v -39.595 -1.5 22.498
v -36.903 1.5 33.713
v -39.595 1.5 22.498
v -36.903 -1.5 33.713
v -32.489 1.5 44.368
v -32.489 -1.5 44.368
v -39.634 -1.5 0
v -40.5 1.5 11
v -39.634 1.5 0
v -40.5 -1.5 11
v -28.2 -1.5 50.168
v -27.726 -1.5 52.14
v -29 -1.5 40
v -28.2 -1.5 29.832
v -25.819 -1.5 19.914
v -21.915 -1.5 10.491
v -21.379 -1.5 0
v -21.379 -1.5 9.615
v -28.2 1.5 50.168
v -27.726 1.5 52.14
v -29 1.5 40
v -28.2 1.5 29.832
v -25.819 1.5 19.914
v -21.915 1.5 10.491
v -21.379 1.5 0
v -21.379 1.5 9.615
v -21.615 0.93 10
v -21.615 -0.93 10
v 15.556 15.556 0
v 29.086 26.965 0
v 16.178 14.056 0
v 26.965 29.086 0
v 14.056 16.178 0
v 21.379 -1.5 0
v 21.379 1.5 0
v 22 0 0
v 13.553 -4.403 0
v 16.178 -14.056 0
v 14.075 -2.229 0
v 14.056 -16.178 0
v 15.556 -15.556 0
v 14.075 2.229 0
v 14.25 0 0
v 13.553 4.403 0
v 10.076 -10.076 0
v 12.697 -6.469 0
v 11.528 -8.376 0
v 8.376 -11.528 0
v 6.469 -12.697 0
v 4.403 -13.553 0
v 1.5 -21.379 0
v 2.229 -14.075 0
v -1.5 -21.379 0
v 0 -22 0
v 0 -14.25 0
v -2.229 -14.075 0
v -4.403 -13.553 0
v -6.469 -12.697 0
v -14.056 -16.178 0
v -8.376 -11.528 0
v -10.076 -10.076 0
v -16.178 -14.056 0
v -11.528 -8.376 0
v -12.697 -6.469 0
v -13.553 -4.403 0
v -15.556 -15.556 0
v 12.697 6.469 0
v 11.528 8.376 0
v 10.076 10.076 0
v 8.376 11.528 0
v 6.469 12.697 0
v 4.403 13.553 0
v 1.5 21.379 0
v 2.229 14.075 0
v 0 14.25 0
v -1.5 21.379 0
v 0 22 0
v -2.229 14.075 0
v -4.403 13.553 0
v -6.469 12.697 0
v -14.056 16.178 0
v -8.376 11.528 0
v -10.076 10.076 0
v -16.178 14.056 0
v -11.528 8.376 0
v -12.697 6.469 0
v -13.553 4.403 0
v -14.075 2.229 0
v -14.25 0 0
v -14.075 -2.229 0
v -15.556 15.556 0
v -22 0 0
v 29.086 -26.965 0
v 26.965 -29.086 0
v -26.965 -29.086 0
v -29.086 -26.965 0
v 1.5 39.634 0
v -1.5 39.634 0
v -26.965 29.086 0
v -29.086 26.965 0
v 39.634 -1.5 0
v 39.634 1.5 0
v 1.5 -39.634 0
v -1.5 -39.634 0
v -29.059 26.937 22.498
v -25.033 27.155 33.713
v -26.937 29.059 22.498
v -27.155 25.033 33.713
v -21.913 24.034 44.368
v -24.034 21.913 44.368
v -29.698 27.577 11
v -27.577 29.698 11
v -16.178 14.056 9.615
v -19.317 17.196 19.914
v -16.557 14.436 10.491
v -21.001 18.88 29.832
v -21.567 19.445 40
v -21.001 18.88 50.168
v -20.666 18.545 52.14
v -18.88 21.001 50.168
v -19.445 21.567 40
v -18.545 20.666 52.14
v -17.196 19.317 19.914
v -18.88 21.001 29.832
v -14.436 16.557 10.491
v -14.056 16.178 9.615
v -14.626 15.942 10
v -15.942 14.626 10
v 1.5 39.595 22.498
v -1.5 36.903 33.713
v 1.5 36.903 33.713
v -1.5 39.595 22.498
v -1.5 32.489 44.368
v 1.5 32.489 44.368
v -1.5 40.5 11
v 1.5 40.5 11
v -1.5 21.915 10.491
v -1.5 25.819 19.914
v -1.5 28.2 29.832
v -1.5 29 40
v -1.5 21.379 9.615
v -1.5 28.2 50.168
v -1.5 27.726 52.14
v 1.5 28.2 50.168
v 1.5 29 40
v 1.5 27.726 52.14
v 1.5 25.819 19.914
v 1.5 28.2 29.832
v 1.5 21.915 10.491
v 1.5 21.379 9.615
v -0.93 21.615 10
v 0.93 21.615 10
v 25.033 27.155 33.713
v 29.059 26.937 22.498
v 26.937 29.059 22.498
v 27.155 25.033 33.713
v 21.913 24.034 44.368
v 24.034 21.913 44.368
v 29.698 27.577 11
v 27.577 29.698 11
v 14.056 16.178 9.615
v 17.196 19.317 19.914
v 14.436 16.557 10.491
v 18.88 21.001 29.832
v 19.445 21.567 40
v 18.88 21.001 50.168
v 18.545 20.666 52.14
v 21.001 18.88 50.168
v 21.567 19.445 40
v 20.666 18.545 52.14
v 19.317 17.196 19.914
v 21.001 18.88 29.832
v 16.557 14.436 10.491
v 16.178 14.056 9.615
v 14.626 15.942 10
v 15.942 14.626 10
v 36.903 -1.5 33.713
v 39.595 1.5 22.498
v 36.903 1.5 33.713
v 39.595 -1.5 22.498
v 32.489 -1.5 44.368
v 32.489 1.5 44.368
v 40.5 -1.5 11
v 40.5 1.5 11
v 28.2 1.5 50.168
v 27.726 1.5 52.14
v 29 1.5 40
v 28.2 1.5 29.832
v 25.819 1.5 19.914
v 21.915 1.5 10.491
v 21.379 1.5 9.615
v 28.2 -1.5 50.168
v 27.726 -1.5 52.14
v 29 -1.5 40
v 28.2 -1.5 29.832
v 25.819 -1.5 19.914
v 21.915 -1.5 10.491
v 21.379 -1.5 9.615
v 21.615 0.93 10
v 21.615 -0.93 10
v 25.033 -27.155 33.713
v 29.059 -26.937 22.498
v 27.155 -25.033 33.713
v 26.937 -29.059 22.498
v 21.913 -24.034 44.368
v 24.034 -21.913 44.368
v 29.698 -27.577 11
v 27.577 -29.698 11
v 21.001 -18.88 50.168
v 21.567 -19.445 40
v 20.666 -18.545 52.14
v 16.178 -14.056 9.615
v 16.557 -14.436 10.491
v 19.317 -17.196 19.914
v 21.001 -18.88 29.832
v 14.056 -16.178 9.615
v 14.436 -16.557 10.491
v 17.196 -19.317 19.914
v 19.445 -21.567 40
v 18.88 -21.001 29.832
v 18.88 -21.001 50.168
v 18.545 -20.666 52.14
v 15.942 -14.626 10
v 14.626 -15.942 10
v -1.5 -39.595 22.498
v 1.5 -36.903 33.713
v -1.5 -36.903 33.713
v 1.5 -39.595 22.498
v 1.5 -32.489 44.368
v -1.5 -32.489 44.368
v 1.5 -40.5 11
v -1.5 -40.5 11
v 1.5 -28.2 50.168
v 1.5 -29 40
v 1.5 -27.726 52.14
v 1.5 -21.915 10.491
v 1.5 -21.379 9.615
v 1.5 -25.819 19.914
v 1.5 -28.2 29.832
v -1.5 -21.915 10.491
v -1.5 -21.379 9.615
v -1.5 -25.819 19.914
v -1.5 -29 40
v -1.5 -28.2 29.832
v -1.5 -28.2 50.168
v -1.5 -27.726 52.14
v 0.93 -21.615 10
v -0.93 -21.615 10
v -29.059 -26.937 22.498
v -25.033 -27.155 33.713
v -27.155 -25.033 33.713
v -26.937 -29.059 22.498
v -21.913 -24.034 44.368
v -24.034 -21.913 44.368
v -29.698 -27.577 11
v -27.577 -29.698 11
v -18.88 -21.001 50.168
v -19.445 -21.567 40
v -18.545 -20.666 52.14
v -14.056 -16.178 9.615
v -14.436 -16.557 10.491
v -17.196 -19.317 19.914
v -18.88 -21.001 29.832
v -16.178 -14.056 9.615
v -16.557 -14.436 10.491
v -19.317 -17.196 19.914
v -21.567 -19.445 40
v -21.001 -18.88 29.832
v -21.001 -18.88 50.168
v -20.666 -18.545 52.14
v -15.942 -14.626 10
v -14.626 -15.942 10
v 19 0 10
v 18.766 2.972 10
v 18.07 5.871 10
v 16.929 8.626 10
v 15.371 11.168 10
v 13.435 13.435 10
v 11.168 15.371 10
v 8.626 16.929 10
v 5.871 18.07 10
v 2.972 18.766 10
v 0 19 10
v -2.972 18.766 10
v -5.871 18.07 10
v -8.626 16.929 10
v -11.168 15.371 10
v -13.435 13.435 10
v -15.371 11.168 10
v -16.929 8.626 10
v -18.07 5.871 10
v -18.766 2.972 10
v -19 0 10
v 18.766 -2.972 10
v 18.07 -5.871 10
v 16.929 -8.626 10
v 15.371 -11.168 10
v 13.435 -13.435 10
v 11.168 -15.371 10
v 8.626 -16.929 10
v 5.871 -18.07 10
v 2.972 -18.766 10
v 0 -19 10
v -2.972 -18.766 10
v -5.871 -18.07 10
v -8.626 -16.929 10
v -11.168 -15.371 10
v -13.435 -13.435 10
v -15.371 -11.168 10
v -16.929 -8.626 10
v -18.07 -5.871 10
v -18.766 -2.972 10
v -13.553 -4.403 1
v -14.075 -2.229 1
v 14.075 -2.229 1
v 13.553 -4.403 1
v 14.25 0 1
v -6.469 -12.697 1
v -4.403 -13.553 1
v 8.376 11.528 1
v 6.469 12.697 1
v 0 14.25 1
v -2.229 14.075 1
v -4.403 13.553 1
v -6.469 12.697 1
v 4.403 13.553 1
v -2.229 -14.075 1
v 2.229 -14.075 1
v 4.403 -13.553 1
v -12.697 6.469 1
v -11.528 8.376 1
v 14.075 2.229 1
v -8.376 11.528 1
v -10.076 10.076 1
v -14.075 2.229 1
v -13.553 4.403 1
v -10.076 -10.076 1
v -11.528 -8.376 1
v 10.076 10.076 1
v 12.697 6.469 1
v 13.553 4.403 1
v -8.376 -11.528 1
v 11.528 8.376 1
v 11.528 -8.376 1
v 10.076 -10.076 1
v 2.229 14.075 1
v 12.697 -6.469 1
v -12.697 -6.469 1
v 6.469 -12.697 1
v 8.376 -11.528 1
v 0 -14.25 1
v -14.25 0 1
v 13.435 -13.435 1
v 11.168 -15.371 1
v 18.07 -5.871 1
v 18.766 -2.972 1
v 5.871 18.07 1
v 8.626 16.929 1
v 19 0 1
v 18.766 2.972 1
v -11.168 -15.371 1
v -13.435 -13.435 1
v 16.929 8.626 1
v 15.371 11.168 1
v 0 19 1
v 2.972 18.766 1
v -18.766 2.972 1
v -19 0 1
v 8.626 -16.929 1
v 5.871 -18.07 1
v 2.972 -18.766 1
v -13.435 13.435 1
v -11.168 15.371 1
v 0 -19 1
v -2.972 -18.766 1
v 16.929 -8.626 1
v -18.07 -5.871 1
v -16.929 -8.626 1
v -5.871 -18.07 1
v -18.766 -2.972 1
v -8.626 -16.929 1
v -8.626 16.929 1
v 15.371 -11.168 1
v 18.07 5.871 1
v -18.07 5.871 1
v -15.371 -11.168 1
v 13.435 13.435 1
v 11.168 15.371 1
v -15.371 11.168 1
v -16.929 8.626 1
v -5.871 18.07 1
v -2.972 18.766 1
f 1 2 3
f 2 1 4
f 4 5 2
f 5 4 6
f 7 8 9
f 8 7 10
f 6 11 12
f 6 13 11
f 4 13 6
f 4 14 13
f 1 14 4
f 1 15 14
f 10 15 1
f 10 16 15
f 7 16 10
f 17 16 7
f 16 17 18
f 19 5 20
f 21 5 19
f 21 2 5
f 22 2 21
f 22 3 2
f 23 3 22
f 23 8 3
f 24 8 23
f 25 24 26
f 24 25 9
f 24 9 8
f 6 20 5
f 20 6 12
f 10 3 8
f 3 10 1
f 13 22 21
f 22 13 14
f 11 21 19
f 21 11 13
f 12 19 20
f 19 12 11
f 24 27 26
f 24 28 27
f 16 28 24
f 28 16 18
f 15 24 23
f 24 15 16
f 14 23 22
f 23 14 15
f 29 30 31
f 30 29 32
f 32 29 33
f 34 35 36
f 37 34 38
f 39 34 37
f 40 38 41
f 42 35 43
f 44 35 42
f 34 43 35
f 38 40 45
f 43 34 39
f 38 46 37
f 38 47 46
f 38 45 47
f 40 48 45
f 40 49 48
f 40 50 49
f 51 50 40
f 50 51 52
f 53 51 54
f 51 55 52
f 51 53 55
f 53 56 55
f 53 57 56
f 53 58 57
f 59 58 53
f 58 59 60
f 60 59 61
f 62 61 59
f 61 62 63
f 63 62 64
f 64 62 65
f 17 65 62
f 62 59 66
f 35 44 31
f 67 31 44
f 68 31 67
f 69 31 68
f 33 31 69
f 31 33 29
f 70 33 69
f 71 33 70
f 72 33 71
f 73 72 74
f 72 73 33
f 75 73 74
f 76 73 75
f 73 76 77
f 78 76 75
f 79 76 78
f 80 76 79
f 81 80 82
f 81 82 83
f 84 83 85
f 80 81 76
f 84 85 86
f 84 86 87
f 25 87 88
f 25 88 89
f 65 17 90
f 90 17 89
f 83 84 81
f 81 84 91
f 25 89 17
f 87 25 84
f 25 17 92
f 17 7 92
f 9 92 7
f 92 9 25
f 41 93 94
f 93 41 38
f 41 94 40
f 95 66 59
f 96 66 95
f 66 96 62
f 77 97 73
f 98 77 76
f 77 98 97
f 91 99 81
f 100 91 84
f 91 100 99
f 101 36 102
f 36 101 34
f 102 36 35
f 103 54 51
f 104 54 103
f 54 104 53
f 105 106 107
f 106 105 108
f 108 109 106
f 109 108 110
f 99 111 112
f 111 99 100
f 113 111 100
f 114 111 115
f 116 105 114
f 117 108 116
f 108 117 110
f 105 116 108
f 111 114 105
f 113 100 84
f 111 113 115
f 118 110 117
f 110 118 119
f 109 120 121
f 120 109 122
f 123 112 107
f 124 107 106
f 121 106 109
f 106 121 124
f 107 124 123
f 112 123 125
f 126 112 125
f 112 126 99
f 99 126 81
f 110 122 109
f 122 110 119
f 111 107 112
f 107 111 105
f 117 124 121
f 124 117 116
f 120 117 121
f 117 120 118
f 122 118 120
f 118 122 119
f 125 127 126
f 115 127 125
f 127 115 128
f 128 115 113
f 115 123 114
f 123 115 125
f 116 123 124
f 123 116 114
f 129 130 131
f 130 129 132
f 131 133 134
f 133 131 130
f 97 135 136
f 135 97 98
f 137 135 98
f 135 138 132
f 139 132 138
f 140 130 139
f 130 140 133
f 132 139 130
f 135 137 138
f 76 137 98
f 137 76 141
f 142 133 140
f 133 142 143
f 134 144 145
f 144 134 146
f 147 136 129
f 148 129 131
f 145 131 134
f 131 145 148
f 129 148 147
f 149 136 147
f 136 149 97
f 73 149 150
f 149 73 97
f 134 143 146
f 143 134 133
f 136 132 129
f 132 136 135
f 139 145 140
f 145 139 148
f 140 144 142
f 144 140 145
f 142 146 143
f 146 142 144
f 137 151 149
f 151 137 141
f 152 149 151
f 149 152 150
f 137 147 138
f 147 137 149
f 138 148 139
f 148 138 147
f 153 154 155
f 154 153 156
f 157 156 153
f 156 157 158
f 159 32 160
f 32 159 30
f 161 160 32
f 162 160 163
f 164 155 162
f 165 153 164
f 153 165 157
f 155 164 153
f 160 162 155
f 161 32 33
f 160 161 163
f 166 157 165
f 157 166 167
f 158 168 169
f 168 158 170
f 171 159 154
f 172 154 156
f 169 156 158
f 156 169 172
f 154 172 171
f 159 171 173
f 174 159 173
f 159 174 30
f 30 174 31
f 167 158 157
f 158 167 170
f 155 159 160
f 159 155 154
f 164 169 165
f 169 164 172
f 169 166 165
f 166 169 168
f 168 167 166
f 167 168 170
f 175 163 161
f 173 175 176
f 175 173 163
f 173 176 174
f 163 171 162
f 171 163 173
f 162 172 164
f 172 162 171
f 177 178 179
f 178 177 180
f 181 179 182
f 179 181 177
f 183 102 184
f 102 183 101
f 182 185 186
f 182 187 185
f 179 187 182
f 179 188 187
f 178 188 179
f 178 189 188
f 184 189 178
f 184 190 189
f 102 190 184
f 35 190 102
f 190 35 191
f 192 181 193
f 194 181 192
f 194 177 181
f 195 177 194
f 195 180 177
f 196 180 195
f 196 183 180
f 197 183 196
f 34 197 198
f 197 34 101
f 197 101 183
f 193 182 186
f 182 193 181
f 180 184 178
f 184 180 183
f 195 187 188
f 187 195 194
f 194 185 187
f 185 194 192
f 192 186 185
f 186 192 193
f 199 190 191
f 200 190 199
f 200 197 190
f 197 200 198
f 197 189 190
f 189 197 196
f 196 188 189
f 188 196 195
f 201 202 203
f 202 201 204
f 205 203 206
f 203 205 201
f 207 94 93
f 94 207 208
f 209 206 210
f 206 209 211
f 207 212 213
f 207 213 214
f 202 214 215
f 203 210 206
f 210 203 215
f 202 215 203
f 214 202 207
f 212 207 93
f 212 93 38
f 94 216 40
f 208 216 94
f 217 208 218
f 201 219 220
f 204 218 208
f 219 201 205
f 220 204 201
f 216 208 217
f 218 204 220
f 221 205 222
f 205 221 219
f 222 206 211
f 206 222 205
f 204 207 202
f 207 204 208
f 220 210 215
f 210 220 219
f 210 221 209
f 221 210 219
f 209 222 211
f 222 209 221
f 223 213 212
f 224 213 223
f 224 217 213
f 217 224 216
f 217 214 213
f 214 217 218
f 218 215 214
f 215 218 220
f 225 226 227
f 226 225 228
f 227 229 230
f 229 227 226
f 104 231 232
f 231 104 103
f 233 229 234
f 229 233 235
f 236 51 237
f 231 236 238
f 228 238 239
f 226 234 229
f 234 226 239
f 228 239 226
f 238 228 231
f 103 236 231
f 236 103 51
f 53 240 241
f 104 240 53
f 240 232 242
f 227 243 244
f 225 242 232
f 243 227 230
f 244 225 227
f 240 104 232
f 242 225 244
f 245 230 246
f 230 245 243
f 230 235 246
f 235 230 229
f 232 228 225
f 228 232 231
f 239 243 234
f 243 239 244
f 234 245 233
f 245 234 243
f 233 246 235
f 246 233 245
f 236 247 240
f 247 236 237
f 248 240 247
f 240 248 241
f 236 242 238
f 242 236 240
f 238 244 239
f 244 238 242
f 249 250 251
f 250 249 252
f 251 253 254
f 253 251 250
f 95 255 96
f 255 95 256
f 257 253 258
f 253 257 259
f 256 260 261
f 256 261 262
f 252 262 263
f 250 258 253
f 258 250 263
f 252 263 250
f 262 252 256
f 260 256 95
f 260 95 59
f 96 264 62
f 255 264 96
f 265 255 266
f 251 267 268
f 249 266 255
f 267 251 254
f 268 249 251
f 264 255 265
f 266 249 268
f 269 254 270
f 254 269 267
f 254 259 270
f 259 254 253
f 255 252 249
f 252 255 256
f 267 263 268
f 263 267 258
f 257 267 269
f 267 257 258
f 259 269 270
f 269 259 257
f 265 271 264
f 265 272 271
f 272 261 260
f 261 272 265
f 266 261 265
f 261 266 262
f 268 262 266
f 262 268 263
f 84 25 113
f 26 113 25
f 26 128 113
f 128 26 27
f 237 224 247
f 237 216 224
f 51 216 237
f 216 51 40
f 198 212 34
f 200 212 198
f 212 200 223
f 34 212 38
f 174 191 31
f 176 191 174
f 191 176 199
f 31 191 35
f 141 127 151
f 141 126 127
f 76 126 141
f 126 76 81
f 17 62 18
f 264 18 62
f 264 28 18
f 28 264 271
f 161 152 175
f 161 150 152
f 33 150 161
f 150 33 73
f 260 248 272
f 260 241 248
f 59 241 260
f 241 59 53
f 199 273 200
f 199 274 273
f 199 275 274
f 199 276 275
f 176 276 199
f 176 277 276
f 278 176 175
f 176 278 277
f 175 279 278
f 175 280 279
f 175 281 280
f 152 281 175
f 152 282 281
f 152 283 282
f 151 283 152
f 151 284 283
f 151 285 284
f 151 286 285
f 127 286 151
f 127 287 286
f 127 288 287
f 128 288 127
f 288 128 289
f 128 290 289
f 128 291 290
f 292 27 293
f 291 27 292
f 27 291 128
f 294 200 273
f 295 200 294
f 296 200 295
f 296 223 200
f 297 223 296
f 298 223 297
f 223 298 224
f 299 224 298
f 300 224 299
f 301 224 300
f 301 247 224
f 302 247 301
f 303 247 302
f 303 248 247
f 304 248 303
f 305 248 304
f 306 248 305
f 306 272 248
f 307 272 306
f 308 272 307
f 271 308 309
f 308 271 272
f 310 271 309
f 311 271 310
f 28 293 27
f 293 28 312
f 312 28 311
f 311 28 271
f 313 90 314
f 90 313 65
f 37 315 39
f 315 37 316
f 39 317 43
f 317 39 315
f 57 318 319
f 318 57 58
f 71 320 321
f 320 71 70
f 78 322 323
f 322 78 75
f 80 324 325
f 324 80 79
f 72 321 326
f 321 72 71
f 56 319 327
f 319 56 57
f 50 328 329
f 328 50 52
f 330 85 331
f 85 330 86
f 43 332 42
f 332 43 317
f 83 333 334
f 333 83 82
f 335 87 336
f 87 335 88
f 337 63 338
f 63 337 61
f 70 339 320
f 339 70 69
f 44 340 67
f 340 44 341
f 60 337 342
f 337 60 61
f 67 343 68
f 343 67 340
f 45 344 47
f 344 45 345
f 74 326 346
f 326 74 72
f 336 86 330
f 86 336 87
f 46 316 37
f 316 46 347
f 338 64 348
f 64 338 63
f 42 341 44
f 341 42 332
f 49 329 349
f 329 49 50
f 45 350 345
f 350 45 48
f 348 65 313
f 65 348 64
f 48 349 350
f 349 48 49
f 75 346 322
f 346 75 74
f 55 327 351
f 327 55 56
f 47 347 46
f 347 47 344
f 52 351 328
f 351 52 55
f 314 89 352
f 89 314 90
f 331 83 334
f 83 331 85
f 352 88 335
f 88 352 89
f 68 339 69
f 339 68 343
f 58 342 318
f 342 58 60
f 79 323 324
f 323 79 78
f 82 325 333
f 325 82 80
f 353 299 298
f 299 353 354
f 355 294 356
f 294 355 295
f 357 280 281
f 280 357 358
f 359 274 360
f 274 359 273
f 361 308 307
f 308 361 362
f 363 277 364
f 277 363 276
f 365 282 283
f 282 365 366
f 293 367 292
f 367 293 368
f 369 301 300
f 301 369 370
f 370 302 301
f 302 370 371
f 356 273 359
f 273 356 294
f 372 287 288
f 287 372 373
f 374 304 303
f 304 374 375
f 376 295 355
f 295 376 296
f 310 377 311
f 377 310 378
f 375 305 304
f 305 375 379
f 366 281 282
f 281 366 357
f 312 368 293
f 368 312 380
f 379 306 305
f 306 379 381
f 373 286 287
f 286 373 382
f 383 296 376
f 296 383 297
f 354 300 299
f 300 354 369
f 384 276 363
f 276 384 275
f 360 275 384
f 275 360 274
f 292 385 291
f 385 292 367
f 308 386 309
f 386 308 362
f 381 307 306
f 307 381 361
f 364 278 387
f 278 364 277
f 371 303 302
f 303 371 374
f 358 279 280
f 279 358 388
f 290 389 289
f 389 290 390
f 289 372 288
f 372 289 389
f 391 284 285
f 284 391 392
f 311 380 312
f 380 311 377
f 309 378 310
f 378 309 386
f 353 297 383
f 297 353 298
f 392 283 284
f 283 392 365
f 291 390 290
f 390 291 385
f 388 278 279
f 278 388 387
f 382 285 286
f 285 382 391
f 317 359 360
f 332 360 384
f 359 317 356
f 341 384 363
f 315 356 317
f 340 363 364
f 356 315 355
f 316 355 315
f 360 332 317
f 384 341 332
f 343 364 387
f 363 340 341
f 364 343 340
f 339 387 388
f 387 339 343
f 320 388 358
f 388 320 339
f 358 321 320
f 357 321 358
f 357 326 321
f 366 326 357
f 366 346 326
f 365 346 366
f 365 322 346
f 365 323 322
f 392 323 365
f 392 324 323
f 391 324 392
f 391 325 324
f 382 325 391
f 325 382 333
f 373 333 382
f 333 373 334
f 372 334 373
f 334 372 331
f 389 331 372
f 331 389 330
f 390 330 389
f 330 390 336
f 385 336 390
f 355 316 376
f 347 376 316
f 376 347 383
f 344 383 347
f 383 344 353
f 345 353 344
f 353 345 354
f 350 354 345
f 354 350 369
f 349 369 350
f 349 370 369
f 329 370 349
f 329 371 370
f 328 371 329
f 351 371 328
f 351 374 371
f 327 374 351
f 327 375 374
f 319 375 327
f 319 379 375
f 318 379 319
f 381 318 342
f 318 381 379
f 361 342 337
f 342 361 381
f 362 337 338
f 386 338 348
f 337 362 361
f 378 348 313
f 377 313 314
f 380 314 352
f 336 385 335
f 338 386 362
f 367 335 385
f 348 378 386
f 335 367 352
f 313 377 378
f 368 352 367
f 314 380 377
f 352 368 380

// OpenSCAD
/// Ikea light mod - March 25,2016


///////// base plate variables
basePlate_d=44;
basePlate_h=10;
baseTubeSub_d=38;
baseTubeSub_h=10;
basePlateSub_d=28.5;    // hole for ikea type G lamp stand
basePlateSub_h=10;
//////////  fins variables
finShape_d=147;
finShape_h=3;
finShapeSub_d=130;
finShapeSub_h=finShape_h+2;

/////////  final assembly
rotate([180,0,0])
    bottomAssy();
module bottomAssy() {
    
    rotate([0,0,0])
        finAssy();
    rotate([0,0,45])
        finAssy();
    rotate([0,0,90])
        finAssy();
    rotate([0,0,135])
        finAssy();
    rotate([0,0,180])
        finAssy();
    rotate([0,0,225])
        finAssy();
    rotate([0,0,270])
        finAssy();
    rotate([0,0,315])
        finAssy();
    translate([0,0,-5])    
    basePlateAssy();
}
module basePlateAssy() {
    difference() {
        basePlate();
        translate([0,0,2])
            basePlateSub();
        translate([0,0,-1])    
            baseTubeSub();
    }
}

module finAssy() {
        translate([-20,0,0])
    rotate([90,0,])             // rotate 90 degrees for assembly
//        translate([-20,-60,-10])
//            cubeShadow();      // width comparison
    difference() {
        translate([53,-11,0])
        finShape(); 
        translate([56,-40,0])
            finShapeSub();
        translate([-22,0,-2])
            cubeSub();          // cut top
        translate([0,-100,-2])
            cubeSub();          // cut right
    }
}

////////// basic shapes
module basePlate() {
    color("blue")
    cylinder(d=basePlate_d, h=basePlate_h, center=true, $fn=8);

}
module finShape() {
    color("green")
    cylinder(d=finShape_d, h=finShape_h, center=true, $fn=40);
    }
////////// Subtractions

module basePlateSub() {
    color("red")
        cylinder(d=basePlateSub_d, h=basePlateSub_h, center=true, $fn=40); 
}
module baseTubeSub() {
    color("orange")
       cylinder(d=baseTubeSub_d, h=baseTubeSub_h, center=true, $fn=40);
}
module finShapeSub() {
    color("yellow")
    cylinder(d=finShapeSub_d, h=finShapeSub_h, center=true, $fn=40);
}

module cubeSub() {
    color("tomato")
    cube([200,200,5]);
}
////////// shadow shapes
    module cubeShadow() {
    color("greenyellow")
    cube([20,60,1]);
}
